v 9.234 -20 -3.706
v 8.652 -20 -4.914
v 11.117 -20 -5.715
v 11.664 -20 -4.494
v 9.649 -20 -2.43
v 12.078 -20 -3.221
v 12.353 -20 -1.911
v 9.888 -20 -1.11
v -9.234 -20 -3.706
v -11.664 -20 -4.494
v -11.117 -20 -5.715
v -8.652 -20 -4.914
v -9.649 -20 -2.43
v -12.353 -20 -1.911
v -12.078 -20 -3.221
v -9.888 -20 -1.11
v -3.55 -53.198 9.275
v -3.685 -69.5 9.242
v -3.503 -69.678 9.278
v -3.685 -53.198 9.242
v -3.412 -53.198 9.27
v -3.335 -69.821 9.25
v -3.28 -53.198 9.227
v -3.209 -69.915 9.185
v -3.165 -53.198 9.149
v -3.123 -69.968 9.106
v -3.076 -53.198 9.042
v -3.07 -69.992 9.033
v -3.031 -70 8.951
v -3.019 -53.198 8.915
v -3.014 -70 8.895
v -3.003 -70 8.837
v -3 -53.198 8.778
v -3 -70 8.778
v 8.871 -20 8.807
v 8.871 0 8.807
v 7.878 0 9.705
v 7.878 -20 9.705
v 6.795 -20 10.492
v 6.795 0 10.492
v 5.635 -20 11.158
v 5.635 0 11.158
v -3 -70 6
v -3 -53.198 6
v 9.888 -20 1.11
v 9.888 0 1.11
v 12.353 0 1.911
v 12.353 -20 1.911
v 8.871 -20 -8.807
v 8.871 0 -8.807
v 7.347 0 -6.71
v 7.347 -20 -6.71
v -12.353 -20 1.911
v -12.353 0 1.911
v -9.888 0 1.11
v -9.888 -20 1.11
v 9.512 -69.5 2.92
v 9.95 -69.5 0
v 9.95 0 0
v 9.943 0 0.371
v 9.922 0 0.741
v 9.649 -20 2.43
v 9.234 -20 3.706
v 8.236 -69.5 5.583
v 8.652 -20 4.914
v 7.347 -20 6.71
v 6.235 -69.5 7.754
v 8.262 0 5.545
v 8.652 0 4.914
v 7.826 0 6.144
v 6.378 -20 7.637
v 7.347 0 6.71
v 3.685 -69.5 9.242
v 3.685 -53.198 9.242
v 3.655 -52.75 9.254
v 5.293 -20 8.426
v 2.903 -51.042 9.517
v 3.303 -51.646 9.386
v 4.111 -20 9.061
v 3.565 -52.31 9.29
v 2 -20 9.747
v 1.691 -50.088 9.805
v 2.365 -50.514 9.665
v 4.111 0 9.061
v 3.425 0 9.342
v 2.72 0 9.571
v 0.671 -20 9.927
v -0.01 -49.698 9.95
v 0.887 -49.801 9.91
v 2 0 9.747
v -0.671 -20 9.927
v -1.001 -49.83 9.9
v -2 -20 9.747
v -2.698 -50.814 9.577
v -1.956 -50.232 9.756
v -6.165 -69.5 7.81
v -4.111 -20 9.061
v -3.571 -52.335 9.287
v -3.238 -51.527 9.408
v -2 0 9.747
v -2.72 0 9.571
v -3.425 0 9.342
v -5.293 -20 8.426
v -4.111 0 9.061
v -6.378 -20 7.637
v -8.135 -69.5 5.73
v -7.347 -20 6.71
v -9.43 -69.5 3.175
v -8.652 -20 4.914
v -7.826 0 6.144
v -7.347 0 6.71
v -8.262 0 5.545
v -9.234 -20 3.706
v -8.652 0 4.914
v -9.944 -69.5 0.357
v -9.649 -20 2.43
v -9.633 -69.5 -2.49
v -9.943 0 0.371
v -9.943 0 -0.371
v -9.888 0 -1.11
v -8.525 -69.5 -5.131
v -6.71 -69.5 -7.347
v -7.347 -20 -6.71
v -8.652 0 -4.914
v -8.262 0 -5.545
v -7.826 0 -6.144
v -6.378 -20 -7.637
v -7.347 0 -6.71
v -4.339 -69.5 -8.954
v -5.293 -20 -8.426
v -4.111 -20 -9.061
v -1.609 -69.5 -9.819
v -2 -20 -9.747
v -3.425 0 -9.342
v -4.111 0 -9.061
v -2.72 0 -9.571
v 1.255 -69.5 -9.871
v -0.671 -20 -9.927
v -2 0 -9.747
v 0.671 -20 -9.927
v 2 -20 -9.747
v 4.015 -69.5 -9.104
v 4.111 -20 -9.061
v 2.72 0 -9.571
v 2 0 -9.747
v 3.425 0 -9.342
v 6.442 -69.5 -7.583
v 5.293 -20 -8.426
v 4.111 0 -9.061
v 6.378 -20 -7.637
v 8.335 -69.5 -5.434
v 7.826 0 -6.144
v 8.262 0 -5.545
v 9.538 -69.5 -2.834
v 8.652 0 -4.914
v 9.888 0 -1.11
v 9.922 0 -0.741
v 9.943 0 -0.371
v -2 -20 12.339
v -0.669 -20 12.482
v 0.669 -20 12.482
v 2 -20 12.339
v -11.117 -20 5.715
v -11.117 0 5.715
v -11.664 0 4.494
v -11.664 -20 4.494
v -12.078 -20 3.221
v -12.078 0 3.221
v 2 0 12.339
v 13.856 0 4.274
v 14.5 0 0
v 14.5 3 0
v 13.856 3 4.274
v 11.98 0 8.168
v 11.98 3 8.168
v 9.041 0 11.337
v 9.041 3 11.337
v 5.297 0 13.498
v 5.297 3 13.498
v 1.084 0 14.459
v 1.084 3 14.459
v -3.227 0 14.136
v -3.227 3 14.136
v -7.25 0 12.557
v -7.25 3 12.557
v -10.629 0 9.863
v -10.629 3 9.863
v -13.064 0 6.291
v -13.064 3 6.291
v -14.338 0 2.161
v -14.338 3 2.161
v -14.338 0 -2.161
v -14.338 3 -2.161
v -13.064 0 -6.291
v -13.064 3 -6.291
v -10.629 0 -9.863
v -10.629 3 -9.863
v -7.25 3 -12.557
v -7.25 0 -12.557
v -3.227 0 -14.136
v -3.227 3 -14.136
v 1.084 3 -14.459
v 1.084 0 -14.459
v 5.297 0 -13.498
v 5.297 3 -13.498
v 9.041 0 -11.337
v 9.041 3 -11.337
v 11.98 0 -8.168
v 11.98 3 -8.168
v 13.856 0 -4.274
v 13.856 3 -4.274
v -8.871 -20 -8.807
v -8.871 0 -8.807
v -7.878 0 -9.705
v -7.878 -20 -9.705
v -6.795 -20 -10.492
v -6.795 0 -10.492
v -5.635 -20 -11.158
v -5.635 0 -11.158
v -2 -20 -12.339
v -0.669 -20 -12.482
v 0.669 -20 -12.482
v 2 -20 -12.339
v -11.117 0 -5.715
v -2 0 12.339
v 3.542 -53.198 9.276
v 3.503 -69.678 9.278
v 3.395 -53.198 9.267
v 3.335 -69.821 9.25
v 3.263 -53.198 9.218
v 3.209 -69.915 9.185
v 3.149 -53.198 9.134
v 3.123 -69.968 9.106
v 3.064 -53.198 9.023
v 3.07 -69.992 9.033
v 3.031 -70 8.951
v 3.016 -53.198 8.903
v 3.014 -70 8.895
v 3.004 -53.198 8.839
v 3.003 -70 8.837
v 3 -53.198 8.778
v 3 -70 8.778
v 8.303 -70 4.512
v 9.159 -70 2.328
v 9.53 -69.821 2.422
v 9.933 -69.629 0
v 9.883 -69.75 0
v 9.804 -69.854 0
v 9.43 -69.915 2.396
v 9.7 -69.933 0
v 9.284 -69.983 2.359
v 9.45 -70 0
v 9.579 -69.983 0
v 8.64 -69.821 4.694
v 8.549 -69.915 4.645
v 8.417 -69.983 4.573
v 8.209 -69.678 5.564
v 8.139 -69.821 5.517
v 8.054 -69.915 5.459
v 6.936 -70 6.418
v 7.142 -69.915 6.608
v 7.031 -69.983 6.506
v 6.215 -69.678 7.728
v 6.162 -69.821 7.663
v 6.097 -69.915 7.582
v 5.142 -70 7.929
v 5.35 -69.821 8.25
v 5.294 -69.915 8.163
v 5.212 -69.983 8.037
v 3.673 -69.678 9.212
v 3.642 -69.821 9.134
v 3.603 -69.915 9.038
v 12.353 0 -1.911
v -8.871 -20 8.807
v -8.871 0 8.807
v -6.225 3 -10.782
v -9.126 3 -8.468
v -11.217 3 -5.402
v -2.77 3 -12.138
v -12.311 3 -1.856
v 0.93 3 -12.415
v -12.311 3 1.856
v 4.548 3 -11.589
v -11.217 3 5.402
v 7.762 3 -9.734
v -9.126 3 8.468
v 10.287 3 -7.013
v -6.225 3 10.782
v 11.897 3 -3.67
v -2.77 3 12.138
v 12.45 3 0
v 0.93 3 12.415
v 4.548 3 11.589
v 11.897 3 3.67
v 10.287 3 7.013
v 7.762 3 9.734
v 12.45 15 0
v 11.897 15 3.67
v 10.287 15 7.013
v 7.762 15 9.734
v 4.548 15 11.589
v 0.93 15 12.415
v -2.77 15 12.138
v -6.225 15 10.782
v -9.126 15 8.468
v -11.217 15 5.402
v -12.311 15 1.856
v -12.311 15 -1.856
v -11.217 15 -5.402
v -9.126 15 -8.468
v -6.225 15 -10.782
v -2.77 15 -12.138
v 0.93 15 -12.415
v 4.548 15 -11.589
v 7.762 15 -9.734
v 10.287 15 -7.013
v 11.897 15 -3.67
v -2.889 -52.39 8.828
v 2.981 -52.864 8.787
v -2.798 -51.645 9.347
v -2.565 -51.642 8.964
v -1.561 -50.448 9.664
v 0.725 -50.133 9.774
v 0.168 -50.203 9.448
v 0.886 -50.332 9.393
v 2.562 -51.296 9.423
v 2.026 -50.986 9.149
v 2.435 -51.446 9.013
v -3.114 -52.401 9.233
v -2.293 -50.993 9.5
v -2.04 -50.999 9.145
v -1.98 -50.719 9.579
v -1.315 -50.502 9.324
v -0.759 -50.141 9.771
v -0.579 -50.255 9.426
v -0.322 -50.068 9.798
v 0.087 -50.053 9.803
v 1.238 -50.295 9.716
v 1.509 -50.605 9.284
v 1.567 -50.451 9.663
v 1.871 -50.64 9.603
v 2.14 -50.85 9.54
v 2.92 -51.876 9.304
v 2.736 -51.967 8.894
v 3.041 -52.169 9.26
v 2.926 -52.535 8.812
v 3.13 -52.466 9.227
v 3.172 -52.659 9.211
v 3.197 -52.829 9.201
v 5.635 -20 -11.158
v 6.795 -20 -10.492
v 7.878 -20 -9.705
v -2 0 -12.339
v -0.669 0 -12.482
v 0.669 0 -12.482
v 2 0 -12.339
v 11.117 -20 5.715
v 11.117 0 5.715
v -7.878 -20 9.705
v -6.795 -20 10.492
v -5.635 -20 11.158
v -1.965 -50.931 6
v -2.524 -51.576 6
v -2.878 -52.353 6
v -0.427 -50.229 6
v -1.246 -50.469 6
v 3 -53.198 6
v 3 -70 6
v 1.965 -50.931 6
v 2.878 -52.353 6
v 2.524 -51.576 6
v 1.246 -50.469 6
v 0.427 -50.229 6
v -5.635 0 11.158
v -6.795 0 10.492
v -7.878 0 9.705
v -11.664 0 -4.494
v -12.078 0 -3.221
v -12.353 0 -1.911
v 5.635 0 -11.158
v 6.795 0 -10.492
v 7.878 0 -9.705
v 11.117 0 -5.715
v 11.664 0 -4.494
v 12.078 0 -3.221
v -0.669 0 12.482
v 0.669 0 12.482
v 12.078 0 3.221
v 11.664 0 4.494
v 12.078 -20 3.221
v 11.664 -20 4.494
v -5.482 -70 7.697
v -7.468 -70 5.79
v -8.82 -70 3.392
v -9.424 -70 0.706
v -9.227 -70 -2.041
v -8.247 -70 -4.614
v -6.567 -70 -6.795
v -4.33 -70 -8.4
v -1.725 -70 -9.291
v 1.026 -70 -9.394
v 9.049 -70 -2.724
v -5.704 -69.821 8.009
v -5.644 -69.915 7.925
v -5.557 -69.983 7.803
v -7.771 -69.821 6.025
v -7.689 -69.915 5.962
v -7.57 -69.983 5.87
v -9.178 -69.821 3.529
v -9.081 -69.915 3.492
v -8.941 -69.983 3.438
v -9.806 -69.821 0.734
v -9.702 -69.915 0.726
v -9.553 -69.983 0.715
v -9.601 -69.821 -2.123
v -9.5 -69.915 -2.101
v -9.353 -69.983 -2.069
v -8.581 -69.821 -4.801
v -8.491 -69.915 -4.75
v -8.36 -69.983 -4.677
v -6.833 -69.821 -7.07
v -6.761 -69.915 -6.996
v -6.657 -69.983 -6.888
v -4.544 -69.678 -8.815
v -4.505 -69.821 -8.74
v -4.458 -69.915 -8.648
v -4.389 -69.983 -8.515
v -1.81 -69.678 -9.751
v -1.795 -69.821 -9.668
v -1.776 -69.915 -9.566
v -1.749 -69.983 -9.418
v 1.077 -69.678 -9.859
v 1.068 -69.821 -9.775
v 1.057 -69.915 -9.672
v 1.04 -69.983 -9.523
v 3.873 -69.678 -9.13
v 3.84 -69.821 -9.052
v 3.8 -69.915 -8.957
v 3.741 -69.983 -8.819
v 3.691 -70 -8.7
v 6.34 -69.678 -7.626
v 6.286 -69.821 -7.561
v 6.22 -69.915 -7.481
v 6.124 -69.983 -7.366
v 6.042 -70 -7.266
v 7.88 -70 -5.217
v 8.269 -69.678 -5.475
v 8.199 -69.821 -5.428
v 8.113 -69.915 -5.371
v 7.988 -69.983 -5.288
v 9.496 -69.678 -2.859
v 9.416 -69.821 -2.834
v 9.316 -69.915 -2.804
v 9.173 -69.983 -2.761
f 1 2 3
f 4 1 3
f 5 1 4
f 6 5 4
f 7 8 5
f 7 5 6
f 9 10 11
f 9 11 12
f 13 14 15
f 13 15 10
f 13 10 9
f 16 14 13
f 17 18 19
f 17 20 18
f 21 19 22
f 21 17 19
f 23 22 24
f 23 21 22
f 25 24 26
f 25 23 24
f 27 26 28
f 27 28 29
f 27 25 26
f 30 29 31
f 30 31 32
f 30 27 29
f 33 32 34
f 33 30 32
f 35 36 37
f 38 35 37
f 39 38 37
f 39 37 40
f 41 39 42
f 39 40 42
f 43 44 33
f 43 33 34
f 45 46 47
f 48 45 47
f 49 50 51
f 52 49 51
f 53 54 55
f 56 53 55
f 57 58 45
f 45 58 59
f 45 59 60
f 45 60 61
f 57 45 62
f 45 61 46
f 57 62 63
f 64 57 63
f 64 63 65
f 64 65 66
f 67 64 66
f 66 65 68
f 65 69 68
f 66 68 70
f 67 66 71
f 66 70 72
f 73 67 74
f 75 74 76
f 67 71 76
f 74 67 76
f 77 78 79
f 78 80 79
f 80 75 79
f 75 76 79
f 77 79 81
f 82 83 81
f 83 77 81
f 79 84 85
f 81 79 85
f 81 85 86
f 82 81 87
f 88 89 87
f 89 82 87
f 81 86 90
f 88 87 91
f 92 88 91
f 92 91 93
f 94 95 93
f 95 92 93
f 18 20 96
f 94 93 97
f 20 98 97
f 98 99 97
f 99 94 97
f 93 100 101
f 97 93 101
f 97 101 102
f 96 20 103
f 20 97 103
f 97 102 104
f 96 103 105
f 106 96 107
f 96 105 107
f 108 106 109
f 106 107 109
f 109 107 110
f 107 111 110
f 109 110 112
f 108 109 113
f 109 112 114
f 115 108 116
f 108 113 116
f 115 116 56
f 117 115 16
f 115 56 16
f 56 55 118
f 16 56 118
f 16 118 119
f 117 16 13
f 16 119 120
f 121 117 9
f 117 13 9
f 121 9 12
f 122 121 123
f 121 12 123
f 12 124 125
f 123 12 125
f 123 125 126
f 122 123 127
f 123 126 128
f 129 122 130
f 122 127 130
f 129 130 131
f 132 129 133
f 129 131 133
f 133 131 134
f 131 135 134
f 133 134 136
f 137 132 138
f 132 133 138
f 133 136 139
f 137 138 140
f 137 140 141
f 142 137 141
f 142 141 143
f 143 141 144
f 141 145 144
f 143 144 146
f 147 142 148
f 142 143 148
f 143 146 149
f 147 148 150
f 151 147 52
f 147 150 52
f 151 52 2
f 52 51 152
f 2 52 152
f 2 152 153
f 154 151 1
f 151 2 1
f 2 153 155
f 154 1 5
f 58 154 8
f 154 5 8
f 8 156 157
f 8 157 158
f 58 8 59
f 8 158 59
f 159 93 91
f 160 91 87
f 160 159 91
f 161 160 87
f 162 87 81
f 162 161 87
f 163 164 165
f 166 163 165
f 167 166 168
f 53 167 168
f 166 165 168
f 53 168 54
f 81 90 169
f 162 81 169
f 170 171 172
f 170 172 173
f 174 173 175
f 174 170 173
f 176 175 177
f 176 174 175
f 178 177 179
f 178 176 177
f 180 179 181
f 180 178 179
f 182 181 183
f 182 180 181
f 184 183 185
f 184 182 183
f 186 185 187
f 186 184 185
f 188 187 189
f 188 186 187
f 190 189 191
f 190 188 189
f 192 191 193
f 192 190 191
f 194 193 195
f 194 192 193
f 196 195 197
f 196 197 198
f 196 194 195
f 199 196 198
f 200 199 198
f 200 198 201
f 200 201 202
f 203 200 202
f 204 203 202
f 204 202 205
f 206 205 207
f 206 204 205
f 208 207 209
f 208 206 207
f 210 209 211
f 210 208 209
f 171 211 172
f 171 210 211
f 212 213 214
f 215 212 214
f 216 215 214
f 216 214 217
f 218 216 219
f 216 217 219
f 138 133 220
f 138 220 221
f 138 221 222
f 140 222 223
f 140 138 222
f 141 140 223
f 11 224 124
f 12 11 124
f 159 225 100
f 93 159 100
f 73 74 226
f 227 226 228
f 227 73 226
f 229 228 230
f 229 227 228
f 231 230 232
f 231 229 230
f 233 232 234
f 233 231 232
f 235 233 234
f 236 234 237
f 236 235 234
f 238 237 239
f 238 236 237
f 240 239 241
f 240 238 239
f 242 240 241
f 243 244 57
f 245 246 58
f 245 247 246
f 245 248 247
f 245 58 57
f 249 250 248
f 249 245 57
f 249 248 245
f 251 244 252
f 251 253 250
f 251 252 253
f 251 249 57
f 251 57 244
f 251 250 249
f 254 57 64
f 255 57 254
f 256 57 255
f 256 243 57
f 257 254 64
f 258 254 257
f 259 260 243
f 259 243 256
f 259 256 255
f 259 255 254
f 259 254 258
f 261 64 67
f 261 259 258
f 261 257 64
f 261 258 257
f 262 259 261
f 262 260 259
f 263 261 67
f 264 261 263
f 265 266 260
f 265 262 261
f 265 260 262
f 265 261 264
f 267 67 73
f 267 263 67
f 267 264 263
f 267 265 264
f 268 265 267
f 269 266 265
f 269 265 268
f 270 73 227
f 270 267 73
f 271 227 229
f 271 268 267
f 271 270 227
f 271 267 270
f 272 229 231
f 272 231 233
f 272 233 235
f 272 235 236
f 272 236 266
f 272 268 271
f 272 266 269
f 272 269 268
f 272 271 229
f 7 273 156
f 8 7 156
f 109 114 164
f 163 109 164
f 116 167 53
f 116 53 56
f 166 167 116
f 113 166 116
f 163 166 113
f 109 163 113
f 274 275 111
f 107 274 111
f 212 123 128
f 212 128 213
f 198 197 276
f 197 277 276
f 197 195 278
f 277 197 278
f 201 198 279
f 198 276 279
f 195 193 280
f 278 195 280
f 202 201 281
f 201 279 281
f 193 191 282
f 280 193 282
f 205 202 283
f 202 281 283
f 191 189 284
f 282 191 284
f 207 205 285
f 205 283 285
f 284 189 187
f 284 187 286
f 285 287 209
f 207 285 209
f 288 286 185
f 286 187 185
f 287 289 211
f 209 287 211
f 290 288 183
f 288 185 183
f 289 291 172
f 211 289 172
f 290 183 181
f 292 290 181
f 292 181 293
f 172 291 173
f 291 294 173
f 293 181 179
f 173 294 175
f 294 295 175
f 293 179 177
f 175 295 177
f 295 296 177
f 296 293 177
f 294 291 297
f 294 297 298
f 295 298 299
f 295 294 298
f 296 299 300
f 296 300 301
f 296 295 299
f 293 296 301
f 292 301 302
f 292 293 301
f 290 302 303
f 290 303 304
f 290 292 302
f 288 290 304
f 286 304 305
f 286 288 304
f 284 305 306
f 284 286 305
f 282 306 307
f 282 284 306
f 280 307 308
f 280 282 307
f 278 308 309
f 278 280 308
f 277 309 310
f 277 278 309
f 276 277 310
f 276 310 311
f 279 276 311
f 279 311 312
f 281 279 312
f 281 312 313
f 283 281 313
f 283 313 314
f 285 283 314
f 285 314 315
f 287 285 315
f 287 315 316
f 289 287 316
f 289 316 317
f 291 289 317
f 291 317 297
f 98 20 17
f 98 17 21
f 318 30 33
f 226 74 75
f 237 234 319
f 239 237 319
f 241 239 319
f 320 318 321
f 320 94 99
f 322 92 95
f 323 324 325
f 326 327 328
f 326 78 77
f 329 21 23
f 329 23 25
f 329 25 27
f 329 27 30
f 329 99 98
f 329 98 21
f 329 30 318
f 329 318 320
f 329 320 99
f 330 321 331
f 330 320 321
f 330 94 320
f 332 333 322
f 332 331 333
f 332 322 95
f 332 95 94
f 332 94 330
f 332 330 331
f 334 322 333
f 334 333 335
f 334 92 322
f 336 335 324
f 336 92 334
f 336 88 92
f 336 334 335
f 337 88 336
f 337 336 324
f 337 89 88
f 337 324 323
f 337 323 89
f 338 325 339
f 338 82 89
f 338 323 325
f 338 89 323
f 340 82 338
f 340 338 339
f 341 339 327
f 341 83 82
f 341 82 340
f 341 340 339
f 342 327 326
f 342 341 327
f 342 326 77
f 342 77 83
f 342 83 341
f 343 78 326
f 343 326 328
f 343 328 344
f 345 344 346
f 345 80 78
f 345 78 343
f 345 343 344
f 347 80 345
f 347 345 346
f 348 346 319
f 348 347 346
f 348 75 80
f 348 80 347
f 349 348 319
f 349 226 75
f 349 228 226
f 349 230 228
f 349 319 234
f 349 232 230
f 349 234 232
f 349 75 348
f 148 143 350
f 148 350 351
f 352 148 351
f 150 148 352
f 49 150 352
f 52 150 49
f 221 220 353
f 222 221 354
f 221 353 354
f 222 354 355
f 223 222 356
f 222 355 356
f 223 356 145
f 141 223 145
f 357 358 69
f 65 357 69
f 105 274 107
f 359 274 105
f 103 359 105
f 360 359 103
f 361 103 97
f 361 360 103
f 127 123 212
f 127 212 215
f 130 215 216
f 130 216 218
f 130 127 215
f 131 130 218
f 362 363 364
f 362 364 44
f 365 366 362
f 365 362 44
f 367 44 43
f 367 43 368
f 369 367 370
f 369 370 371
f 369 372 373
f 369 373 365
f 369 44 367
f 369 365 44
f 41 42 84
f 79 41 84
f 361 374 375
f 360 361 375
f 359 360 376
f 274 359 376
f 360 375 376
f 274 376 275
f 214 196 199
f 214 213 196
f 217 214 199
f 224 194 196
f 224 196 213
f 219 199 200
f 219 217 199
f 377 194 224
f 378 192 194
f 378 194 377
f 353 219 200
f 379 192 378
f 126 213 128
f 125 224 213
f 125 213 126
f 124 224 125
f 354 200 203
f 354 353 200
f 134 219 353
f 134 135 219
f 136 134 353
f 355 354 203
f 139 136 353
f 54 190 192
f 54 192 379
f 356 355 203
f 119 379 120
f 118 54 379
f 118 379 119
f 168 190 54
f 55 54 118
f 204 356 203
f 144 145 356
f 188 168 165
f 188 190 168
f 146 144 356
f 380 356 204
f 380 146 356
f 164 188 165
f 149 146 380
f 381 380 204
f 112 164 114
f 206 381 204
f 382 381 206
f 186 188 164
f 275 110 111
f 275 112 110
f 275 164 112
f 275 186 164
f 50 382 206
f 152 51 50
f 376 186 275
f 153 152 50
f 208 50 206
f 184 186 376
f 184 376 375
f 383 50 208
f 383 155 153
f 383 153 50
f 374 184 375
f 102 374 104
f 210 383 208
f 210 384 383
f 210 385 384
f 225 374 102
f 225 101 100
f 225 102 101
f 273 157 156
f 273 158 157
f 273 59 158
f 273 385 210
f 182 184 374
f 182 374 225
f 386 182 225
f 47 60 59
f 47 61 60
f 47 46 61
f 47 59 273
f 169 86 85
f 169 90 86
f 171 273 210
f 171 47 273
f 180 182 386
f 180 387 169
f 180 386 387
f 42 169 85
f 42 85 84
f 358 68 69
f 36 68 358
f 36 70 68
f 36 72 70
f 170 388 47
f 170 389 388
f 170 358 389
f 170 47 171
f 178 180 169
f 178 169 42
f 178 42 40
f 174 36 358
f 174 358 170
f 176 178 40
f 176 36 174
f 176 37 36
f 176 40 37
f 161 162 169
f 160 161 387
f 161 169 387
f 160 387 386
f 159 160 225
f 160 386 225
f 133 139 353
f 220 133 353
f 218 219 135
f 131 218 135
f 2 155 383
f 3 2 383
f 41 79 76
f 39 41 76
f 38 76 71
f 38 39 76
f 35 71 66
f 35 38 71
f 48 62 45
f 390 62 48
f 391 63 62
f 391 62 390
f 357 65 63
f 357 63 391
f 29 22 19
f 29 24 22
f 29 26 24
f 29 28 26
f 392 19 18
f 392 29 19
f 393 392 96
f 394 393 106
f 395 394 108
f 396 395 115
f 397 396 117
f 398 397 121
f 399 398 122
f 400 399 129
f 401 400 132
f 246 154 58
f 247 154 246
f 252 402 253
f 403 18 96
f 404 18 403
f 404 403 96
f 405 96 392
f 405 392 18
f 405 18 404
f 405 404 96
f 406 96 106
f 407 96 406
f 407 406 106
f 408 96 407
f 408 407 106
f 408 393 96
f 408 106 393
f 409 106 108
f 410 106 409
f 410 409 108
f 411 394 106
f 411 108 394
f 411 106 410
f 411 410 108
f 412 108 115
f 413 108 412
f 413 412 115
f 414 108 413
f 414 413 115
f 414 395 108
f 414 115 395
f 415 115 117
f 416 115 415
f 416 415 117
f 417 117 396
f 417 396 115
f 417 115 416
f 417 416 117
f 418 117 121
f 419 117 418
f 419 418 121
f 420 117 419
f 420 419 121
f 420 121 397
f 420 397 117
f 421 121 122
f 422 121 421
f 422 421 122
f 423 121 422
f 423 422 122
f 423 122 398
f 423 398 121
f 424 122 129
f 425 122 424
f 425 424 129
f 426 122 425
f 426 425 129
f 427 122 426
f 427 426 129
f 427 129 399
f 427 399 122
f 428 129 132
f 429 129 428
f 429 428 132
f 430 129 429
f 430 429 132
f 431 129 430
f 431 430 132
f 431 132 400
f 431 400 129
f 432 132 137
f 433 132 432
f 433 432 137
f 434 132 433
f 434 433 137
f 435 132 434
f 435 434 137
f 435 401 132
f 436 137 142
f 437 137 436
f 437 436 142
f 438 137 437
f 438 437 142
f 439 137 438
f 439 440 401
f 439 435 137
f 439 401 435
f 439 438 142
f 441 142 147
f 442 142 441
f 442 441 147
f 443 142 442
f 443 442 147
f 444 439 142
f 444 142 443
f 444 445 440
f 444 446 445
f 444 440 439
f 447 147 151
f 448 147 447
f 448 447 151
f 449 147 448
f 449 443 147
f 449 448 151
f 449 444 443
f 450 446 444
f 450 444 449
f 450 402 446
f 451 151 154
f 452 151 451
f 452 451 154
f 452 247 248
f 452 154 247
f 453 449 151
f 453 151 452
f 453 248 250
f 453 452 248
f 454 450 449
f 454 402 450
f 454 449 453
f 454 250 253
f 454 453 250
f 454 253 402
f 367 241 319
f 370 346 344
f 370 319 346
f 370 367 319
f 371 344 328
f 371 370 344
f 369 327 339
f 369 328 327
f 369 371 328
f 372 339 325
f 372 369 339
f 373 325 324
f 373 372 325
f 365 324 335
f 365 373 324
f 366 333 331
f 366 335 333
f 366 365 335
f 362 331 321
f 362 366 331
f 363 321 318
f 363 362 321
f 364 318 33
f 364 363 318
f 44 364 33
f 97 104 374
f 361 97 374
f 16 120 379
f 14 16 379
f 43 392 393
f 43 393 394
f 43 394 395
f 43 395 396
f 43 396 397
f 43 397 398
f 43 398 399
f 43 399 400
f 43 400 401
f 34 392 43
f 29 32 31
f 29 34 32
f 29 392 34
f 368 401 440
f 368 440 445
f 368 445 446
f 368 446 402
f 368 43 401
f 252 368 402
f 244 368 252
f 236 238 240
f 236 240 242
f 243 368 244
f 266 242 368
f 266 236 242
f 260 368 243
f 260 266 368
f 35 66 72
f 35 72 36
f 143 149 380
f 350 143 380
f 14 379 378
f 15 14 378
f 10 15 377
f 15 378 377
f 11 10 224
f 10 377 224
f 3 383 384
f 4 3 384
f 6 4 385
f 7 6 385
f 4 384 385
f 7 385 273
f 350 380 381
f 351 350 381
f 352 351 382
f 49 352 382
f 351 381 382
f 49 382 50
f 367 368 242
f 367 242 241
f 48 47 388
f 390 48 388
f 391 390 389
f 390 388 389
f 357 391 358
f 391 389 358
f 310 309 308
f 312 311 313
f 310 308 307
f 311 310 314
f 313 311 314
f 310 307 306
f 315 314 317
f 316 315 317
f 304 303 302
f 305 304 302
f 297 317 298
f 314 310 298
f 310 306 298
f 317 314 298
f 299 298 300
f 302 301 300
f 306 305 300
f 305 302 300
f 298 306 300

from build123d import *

# Parameters (mm, degrees)
F0_R     = 9.95
F1_DEPTH = 70
F0_R_2   = 12.45
F2_DEPTH = 15
F0_R_3   = 14.5
F3_DEPTH = 3
F5_DEPTH = 20
F8_DEPTH = 3.95
F9_R     = 0.5


with BuildPart() as f1:
    # F0 (on Front) → F1 (new body)
    with BuildSketch(Plane.XZ):
        Circle(F0_R)
    extrude(amount=F1_DEPTH)

    # F0 (on Front) → F2 (join)
    with BuildSketch(Plane.XZ):
        Circle(F0_R_2)
        Circle(F0_R, mode=Mode.SUBTRACT)
        Circle(F0_R)
    extrude(amount=-F2_DEPTH)

    # F0 (on Front) → F3 (join)
    with BuildSketch(Plane.XZ):
        Circle(F0_R_3)
        Circle(F0_R_2, mode=Mode.SUBTRACT)
        Circle(F0_R_2)
        Circle(F0_R, mode=Mode.SUBTRACT)
        Circle(F0_R)
    extrude(amount=-F3_DEPTH)

    # F4 (on Front) → F5 (join)
    with BuildSketch(Plane.XZ):
        with BuildLine():
            Line((8.6518402555, -4.9140777561), (11.1170168717, -5.7150621934))
            ThreePointArc((11.1170168717, -5.7150621934), (11.8882064537, -3.8627124297), (12.3530848492, -1.9108361283))
            Line((12.3530848492, -1.9108361283), (9.887908233, -1.109851691))
            ThreePointArc((9.887908233, -1.109851691), (9.4630123371, -3.074719094), (8.6518402555, -4.9140777561))
        make_face()
        with BuildLine():
            Line((4.1110633656, -9.0609965238), (5.6346263027, -11.1580010051))
            ThreePointArc((5.6346263027, -11.1580010051), (7.3473156537, -10.1127124297), (8.8706942802, -8.8068599959))
            Line((8.8706942802, -8.8068599959), (7.3471313431, -6.7098555146))
            ThreePointArc((7.3471313431, -6.7098555146), (5.8484632603, -8.049719094), (4.1110633656, -9.0609965238))
        make_face()
        with BuildLine():
            ThreePointArc((2, -9.7469225913), (0, -9.95), (-2, -9.7469225913))
            Line((-2, -9.7469225913), (-2, -12.3389626793))
            ThreePointArc((-2, -12.3389626793), (0, -12.5), (2, -12.3389626793))
            Line((2, -12.3389626793), (2, -9.7469225913))
        make_face()
        with BuildLine():
            Line((-7.3471313431, -6.7098555146), (-8.8706942802, -8.8068599959))
            ThreePointArc((-8.8706942802, -8.8068599959), (-7.3473156537, -10.1127124297), (-5.6346263027, -11.1580010051))
            Line((-5.6346263027, -11.1580010051), (-4.1110633656, -9.0609965238))
            ThreePointArc((-4.1110633656, -9.0609965238), (-5.8484632603, -8.049719094), (-7.3471313431, -6.7098555146))
        make_face()
        with BuildLine():
            Line((-9.887908233, -1.109851691), (-12.3530848492, -1.9108361283))
            ThreePointArc((-12.3530848492, -1.9108361283), (-11.8882064537, -3.8627124297), (-11.1170168717, -5.7150621934))
            Line((-11.1170168717, -5.7150621934), (-8.6518402555, -4.9140777561))
            ThreePointArc((-8.6518402555, -4.9140777561), (-9.4630123371, -3.074719094), (-9.887908233, -1.109851691))
        make_face()
        with BuildLine():
            Line((-8.6518402555, 4.9140777561), (-11.1170168717, 5.7150621934))
            ThreePointArc((-11.1170168717, 5.7150621934), (-11.8882064537, 3.8627124297), (-12.3530848492, 1.9108361283))
            Line((-12.3530848492, 1.9108361283), (-9.887908233, 1.109851691))
            ThreePointArc((-9.887908233, 1.109851691), (-9.4630123371, 3.074719094), (-8.6518402555, 4.9140777561))
        make_face()
        with BuildLine():
            Line((-4.1110633656, 9.0609965238), (-5.6346263027, 11.1580010051))
            ThreePointArc((-5.6346263027, 11.1580010051), (-7.3473156537, 10.1127124297), (-8.8706942802, 8.8068599959))
            Line((-8.8706942802, 8.8068599959), (-7.3471313431, 6.7098555146))
            ThreePointArc((-7.3471313431, 6.7098555146), (-5.8484632603, 8.049719094), (-4.1110633656, 9.0609965238))
        make_face()
        with BuildLine():
            ThreePointArc((-2, 9.7469225913), (0, 9.95), (2, 9.7469225913))
            Line((2, 9.7469225913), (2, 12.3389626793))
            ThreePointArc((2, 12.3389626793), (0, 12.5), (-2, 12.3389626793))
            Line((-2, 12.3389626793), (-2, 9.7469225913))
        make_face()
        with BuildLine():
            Line((7.3471313431, 6.7098555146), (8.8706942802, 8.8068599959))
            ThreePointArc((8.8706942802, 8.8068599959), (7.3473156537, 10.1127124297), (5.6346263027, 11.1580010051))
            Line((5.6346263027, 11.1580010051), (4.1110633656, 9.0609965238))
            ThreePointArc((4.1110633656, 9.0609965238), (5.8484632603, 8.049719094), (7.3471313431, 6.7098555146))
        make_face()
        with BuildLine():
            Line((9.887908233, 1.109851691), (12.3530848492, 1.9108361283))
            ThreePointArc((12.3530848492, 1.9108361283), (11.8882064537, 3.8627124297), (11.1170168717, 5.7150621934))
            Line((11.1170168717, 5.7150621934), (8.6518402555, 4.9140777561))
            ThreePointArc((8.6518402555, 4.9140777561), (9.4630123371, 3.074719094), (9.887908233, 1.109851691))
        make_face()
    extrude(amount=F5_DEPTH)

    # F7 (on offset) → F8 (cut)
    with BuildSketch(Plane.XY.offset(6)):
        with BuildLine():
            Line((-3, -73.1982216239), (0, -73.1982216239))
            Line((0, -73.1982216239), (3, -73.1982216239))
            Line((3, -73.1982216239), (3, -53.1982216239))
            ThreePointArc((3, -53.1982216239), (0, -50.1982216239), (-3, -53.1982216239))
            Line((-3, -53.1982216239), (-3, -73.1982216239))
        make_face()
    extrude(amount=F8_DEPTH, mode=Mode.SUBTRACT)

    # F9
    f9_edges = [f1.edges().sort_by_distance(p)[0] for p in [
        (-5.880157, -70, -8.026596),
        (-3, -61.599111, 9.486965),
        (0, -50.198222, 9.95),
        (3, -61.599111, 9.486965),
    ]]
    fillet(f9_edges, radius=F9_R)


solid = f1.part
